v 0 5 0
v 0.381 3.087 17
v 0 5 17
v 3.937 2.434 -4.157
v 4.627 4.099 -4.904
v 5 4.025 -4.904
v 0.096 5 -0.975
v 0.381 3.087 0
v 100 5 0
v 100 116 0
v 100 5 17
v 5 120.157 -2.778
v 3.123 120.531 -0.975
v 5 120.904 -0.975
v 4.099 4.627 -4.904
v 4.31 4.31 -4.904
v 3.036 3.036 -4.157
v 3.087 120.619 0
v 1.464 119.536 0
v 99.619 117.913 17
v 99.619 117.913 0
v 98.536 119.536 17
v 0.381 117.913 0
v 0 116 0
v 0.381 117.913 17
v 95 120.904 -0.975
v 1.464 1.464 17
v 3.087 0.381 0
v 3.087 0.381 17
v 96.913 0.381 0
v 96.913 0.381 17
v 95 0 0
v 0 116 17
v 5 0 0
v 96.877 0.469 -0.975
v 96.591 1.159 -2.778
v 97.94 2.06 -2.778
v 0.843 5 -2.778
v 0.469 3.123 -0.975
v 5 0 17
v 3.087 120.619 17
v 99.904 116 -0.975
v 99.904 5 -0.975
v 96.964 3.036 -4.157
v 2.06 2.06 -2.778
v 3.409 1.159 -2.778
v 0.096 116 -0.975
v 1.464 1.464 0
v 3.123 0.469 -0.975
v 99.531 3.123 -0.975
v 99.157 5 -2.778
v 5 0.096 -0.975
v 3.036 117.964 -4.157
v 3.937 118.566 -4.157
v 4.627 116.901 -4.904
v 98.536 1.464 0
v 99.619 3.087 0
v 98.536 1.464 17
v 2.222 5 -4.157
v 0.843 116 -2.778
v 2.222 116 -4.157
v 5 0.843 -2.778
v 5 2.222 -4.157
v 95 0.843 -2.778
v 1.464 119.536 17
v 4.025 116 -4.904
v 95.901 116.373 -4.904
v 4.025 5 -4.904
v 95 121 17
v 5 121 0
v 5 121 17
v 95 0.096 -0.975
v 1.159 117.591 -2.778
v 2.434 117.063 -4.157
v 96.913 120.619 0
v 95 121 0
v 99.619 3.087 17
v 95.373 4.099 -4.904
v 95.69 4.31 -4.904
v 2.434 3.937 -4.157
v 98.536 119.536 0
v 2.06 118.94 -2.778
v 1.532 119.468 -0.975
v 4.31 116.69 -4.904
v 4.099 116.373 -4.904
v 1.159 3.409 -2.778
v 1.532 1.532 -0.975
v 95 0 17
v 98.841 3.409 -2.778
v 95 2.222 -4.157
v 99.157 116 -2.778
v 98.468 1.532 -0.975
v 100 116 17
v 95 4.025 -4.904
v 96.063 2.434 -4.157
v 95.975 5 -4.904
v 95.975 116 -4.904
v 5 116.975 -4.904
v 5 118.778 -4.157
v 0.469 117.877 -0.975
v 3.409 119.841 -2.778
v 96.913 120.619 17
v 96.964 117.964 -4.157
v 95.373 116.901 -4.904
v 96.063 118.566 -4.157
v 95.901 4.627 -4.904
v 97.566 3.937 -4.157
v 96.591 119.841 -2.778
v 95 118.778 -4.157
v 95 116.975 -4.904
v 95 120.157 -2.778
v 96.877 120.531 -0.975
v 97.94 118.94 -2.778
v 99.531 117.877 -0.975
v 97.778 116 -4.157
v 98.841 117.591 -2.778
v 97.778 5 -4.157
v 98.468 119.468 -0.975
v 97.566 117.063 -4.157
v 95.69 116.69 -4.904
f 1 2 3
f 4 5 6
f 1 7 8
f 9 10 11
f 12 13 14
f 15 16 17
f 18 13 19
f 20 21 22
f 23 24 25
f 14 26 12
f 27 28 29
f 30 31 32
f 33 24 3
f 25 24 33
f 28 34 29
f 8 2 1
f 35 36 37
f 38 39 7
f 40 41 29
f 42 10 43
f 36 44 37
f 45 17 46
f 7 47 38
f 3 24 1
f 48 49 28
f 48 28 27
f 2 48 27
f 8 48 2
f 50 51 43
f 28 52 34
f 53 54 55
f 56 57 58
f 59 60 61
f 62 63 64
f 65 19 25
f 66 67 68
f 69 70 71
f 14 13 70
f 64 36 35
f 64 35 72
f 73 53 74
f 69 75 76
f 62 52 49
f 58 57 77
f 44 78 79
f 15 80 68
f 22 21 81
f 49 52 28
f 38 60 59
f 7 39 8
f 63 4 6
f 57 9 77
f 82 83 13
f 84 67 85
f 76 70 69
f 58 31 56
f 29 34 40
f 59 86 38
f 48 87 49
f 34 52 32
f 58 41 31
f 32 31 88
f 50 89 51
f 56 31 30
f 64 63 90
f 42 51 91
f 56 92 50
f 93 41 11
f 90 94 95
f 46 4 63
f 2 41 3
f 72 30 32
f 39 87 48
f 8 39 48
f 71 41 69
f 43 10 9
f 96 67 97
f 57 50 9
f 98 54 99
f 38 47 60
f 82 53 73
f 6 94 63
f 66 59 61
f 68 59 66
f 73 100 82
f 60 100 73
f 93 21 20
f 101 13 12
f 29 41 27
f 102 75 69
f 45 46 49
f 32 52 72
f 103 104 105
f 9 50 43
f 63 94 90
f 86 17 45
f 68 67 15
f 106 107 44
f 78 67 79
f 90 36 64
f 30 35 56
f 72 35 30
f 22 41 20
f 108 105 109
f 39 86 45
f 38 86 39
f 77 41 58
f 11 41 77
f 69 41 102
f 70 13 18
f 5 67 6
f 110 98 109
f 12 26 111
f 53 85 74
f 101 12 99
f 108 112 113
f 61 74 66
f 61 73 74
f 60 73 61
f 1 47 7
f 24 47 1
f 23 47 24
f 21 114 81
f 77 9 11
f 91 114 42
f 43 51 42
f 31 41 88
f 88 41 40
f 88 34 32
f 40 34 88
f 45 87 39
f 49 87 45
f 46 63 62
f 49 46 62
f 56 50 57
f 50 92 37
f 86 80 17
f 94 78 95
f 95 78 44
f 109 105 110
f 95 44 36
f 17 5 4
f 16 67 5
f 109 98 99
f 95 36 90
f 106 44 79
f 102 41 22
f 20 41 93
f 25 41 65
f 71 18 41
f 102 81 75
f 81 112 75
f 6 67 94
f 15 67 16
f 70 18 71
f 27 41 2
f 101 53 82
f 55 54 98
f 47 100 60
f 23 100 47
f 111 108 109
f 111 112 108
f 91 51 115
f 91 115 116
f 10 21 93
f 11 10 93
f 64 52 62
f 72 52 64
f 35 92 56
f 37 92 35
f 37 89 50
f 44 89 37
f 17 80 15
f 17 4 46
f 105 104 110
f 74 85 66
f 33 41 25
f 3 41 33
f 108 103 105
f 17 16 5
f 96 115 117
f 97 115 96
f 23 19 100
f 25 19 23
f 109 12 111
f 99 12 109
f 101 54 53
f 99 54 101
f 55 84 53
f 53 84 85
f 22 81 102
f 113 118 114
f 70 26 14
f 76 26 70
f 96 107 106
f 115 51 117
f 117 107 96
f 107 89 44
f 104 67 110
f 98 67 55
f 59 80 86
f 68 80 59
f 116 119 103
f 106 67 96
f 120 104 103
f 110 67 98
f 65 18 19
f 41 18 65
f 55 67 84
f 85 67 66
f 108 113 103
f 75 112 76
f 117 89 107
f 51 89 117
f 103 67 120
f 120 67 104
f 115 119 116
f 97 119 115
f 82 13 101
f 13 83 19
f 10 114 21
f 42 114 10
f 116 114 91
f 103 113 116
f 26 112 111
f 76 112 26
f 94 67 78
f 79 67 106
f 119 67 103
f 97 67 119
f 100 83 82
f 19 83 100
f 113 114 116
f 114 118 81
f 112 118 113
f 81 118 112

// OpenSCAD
use <MCAD/units.scad>;

module tray(width, depth, height, radius) {
    points = [ [abs(0+radius),abs(0+radius),0],
               [abs(width-radius),(0+radius),0],
               [abs(width-radius),abs(depth-radius),0],
               [abs(0+radius),abs(depth-radius),0] 
             ];
    hull() {
        for (p = points) {
            translate(p) sphere(r = abs(radius));
            translate(p) cylinder(r = abs(radius),
                                  h = abs(height - radius));
        };
    };
};

//example
tray(100,121,22,5);
